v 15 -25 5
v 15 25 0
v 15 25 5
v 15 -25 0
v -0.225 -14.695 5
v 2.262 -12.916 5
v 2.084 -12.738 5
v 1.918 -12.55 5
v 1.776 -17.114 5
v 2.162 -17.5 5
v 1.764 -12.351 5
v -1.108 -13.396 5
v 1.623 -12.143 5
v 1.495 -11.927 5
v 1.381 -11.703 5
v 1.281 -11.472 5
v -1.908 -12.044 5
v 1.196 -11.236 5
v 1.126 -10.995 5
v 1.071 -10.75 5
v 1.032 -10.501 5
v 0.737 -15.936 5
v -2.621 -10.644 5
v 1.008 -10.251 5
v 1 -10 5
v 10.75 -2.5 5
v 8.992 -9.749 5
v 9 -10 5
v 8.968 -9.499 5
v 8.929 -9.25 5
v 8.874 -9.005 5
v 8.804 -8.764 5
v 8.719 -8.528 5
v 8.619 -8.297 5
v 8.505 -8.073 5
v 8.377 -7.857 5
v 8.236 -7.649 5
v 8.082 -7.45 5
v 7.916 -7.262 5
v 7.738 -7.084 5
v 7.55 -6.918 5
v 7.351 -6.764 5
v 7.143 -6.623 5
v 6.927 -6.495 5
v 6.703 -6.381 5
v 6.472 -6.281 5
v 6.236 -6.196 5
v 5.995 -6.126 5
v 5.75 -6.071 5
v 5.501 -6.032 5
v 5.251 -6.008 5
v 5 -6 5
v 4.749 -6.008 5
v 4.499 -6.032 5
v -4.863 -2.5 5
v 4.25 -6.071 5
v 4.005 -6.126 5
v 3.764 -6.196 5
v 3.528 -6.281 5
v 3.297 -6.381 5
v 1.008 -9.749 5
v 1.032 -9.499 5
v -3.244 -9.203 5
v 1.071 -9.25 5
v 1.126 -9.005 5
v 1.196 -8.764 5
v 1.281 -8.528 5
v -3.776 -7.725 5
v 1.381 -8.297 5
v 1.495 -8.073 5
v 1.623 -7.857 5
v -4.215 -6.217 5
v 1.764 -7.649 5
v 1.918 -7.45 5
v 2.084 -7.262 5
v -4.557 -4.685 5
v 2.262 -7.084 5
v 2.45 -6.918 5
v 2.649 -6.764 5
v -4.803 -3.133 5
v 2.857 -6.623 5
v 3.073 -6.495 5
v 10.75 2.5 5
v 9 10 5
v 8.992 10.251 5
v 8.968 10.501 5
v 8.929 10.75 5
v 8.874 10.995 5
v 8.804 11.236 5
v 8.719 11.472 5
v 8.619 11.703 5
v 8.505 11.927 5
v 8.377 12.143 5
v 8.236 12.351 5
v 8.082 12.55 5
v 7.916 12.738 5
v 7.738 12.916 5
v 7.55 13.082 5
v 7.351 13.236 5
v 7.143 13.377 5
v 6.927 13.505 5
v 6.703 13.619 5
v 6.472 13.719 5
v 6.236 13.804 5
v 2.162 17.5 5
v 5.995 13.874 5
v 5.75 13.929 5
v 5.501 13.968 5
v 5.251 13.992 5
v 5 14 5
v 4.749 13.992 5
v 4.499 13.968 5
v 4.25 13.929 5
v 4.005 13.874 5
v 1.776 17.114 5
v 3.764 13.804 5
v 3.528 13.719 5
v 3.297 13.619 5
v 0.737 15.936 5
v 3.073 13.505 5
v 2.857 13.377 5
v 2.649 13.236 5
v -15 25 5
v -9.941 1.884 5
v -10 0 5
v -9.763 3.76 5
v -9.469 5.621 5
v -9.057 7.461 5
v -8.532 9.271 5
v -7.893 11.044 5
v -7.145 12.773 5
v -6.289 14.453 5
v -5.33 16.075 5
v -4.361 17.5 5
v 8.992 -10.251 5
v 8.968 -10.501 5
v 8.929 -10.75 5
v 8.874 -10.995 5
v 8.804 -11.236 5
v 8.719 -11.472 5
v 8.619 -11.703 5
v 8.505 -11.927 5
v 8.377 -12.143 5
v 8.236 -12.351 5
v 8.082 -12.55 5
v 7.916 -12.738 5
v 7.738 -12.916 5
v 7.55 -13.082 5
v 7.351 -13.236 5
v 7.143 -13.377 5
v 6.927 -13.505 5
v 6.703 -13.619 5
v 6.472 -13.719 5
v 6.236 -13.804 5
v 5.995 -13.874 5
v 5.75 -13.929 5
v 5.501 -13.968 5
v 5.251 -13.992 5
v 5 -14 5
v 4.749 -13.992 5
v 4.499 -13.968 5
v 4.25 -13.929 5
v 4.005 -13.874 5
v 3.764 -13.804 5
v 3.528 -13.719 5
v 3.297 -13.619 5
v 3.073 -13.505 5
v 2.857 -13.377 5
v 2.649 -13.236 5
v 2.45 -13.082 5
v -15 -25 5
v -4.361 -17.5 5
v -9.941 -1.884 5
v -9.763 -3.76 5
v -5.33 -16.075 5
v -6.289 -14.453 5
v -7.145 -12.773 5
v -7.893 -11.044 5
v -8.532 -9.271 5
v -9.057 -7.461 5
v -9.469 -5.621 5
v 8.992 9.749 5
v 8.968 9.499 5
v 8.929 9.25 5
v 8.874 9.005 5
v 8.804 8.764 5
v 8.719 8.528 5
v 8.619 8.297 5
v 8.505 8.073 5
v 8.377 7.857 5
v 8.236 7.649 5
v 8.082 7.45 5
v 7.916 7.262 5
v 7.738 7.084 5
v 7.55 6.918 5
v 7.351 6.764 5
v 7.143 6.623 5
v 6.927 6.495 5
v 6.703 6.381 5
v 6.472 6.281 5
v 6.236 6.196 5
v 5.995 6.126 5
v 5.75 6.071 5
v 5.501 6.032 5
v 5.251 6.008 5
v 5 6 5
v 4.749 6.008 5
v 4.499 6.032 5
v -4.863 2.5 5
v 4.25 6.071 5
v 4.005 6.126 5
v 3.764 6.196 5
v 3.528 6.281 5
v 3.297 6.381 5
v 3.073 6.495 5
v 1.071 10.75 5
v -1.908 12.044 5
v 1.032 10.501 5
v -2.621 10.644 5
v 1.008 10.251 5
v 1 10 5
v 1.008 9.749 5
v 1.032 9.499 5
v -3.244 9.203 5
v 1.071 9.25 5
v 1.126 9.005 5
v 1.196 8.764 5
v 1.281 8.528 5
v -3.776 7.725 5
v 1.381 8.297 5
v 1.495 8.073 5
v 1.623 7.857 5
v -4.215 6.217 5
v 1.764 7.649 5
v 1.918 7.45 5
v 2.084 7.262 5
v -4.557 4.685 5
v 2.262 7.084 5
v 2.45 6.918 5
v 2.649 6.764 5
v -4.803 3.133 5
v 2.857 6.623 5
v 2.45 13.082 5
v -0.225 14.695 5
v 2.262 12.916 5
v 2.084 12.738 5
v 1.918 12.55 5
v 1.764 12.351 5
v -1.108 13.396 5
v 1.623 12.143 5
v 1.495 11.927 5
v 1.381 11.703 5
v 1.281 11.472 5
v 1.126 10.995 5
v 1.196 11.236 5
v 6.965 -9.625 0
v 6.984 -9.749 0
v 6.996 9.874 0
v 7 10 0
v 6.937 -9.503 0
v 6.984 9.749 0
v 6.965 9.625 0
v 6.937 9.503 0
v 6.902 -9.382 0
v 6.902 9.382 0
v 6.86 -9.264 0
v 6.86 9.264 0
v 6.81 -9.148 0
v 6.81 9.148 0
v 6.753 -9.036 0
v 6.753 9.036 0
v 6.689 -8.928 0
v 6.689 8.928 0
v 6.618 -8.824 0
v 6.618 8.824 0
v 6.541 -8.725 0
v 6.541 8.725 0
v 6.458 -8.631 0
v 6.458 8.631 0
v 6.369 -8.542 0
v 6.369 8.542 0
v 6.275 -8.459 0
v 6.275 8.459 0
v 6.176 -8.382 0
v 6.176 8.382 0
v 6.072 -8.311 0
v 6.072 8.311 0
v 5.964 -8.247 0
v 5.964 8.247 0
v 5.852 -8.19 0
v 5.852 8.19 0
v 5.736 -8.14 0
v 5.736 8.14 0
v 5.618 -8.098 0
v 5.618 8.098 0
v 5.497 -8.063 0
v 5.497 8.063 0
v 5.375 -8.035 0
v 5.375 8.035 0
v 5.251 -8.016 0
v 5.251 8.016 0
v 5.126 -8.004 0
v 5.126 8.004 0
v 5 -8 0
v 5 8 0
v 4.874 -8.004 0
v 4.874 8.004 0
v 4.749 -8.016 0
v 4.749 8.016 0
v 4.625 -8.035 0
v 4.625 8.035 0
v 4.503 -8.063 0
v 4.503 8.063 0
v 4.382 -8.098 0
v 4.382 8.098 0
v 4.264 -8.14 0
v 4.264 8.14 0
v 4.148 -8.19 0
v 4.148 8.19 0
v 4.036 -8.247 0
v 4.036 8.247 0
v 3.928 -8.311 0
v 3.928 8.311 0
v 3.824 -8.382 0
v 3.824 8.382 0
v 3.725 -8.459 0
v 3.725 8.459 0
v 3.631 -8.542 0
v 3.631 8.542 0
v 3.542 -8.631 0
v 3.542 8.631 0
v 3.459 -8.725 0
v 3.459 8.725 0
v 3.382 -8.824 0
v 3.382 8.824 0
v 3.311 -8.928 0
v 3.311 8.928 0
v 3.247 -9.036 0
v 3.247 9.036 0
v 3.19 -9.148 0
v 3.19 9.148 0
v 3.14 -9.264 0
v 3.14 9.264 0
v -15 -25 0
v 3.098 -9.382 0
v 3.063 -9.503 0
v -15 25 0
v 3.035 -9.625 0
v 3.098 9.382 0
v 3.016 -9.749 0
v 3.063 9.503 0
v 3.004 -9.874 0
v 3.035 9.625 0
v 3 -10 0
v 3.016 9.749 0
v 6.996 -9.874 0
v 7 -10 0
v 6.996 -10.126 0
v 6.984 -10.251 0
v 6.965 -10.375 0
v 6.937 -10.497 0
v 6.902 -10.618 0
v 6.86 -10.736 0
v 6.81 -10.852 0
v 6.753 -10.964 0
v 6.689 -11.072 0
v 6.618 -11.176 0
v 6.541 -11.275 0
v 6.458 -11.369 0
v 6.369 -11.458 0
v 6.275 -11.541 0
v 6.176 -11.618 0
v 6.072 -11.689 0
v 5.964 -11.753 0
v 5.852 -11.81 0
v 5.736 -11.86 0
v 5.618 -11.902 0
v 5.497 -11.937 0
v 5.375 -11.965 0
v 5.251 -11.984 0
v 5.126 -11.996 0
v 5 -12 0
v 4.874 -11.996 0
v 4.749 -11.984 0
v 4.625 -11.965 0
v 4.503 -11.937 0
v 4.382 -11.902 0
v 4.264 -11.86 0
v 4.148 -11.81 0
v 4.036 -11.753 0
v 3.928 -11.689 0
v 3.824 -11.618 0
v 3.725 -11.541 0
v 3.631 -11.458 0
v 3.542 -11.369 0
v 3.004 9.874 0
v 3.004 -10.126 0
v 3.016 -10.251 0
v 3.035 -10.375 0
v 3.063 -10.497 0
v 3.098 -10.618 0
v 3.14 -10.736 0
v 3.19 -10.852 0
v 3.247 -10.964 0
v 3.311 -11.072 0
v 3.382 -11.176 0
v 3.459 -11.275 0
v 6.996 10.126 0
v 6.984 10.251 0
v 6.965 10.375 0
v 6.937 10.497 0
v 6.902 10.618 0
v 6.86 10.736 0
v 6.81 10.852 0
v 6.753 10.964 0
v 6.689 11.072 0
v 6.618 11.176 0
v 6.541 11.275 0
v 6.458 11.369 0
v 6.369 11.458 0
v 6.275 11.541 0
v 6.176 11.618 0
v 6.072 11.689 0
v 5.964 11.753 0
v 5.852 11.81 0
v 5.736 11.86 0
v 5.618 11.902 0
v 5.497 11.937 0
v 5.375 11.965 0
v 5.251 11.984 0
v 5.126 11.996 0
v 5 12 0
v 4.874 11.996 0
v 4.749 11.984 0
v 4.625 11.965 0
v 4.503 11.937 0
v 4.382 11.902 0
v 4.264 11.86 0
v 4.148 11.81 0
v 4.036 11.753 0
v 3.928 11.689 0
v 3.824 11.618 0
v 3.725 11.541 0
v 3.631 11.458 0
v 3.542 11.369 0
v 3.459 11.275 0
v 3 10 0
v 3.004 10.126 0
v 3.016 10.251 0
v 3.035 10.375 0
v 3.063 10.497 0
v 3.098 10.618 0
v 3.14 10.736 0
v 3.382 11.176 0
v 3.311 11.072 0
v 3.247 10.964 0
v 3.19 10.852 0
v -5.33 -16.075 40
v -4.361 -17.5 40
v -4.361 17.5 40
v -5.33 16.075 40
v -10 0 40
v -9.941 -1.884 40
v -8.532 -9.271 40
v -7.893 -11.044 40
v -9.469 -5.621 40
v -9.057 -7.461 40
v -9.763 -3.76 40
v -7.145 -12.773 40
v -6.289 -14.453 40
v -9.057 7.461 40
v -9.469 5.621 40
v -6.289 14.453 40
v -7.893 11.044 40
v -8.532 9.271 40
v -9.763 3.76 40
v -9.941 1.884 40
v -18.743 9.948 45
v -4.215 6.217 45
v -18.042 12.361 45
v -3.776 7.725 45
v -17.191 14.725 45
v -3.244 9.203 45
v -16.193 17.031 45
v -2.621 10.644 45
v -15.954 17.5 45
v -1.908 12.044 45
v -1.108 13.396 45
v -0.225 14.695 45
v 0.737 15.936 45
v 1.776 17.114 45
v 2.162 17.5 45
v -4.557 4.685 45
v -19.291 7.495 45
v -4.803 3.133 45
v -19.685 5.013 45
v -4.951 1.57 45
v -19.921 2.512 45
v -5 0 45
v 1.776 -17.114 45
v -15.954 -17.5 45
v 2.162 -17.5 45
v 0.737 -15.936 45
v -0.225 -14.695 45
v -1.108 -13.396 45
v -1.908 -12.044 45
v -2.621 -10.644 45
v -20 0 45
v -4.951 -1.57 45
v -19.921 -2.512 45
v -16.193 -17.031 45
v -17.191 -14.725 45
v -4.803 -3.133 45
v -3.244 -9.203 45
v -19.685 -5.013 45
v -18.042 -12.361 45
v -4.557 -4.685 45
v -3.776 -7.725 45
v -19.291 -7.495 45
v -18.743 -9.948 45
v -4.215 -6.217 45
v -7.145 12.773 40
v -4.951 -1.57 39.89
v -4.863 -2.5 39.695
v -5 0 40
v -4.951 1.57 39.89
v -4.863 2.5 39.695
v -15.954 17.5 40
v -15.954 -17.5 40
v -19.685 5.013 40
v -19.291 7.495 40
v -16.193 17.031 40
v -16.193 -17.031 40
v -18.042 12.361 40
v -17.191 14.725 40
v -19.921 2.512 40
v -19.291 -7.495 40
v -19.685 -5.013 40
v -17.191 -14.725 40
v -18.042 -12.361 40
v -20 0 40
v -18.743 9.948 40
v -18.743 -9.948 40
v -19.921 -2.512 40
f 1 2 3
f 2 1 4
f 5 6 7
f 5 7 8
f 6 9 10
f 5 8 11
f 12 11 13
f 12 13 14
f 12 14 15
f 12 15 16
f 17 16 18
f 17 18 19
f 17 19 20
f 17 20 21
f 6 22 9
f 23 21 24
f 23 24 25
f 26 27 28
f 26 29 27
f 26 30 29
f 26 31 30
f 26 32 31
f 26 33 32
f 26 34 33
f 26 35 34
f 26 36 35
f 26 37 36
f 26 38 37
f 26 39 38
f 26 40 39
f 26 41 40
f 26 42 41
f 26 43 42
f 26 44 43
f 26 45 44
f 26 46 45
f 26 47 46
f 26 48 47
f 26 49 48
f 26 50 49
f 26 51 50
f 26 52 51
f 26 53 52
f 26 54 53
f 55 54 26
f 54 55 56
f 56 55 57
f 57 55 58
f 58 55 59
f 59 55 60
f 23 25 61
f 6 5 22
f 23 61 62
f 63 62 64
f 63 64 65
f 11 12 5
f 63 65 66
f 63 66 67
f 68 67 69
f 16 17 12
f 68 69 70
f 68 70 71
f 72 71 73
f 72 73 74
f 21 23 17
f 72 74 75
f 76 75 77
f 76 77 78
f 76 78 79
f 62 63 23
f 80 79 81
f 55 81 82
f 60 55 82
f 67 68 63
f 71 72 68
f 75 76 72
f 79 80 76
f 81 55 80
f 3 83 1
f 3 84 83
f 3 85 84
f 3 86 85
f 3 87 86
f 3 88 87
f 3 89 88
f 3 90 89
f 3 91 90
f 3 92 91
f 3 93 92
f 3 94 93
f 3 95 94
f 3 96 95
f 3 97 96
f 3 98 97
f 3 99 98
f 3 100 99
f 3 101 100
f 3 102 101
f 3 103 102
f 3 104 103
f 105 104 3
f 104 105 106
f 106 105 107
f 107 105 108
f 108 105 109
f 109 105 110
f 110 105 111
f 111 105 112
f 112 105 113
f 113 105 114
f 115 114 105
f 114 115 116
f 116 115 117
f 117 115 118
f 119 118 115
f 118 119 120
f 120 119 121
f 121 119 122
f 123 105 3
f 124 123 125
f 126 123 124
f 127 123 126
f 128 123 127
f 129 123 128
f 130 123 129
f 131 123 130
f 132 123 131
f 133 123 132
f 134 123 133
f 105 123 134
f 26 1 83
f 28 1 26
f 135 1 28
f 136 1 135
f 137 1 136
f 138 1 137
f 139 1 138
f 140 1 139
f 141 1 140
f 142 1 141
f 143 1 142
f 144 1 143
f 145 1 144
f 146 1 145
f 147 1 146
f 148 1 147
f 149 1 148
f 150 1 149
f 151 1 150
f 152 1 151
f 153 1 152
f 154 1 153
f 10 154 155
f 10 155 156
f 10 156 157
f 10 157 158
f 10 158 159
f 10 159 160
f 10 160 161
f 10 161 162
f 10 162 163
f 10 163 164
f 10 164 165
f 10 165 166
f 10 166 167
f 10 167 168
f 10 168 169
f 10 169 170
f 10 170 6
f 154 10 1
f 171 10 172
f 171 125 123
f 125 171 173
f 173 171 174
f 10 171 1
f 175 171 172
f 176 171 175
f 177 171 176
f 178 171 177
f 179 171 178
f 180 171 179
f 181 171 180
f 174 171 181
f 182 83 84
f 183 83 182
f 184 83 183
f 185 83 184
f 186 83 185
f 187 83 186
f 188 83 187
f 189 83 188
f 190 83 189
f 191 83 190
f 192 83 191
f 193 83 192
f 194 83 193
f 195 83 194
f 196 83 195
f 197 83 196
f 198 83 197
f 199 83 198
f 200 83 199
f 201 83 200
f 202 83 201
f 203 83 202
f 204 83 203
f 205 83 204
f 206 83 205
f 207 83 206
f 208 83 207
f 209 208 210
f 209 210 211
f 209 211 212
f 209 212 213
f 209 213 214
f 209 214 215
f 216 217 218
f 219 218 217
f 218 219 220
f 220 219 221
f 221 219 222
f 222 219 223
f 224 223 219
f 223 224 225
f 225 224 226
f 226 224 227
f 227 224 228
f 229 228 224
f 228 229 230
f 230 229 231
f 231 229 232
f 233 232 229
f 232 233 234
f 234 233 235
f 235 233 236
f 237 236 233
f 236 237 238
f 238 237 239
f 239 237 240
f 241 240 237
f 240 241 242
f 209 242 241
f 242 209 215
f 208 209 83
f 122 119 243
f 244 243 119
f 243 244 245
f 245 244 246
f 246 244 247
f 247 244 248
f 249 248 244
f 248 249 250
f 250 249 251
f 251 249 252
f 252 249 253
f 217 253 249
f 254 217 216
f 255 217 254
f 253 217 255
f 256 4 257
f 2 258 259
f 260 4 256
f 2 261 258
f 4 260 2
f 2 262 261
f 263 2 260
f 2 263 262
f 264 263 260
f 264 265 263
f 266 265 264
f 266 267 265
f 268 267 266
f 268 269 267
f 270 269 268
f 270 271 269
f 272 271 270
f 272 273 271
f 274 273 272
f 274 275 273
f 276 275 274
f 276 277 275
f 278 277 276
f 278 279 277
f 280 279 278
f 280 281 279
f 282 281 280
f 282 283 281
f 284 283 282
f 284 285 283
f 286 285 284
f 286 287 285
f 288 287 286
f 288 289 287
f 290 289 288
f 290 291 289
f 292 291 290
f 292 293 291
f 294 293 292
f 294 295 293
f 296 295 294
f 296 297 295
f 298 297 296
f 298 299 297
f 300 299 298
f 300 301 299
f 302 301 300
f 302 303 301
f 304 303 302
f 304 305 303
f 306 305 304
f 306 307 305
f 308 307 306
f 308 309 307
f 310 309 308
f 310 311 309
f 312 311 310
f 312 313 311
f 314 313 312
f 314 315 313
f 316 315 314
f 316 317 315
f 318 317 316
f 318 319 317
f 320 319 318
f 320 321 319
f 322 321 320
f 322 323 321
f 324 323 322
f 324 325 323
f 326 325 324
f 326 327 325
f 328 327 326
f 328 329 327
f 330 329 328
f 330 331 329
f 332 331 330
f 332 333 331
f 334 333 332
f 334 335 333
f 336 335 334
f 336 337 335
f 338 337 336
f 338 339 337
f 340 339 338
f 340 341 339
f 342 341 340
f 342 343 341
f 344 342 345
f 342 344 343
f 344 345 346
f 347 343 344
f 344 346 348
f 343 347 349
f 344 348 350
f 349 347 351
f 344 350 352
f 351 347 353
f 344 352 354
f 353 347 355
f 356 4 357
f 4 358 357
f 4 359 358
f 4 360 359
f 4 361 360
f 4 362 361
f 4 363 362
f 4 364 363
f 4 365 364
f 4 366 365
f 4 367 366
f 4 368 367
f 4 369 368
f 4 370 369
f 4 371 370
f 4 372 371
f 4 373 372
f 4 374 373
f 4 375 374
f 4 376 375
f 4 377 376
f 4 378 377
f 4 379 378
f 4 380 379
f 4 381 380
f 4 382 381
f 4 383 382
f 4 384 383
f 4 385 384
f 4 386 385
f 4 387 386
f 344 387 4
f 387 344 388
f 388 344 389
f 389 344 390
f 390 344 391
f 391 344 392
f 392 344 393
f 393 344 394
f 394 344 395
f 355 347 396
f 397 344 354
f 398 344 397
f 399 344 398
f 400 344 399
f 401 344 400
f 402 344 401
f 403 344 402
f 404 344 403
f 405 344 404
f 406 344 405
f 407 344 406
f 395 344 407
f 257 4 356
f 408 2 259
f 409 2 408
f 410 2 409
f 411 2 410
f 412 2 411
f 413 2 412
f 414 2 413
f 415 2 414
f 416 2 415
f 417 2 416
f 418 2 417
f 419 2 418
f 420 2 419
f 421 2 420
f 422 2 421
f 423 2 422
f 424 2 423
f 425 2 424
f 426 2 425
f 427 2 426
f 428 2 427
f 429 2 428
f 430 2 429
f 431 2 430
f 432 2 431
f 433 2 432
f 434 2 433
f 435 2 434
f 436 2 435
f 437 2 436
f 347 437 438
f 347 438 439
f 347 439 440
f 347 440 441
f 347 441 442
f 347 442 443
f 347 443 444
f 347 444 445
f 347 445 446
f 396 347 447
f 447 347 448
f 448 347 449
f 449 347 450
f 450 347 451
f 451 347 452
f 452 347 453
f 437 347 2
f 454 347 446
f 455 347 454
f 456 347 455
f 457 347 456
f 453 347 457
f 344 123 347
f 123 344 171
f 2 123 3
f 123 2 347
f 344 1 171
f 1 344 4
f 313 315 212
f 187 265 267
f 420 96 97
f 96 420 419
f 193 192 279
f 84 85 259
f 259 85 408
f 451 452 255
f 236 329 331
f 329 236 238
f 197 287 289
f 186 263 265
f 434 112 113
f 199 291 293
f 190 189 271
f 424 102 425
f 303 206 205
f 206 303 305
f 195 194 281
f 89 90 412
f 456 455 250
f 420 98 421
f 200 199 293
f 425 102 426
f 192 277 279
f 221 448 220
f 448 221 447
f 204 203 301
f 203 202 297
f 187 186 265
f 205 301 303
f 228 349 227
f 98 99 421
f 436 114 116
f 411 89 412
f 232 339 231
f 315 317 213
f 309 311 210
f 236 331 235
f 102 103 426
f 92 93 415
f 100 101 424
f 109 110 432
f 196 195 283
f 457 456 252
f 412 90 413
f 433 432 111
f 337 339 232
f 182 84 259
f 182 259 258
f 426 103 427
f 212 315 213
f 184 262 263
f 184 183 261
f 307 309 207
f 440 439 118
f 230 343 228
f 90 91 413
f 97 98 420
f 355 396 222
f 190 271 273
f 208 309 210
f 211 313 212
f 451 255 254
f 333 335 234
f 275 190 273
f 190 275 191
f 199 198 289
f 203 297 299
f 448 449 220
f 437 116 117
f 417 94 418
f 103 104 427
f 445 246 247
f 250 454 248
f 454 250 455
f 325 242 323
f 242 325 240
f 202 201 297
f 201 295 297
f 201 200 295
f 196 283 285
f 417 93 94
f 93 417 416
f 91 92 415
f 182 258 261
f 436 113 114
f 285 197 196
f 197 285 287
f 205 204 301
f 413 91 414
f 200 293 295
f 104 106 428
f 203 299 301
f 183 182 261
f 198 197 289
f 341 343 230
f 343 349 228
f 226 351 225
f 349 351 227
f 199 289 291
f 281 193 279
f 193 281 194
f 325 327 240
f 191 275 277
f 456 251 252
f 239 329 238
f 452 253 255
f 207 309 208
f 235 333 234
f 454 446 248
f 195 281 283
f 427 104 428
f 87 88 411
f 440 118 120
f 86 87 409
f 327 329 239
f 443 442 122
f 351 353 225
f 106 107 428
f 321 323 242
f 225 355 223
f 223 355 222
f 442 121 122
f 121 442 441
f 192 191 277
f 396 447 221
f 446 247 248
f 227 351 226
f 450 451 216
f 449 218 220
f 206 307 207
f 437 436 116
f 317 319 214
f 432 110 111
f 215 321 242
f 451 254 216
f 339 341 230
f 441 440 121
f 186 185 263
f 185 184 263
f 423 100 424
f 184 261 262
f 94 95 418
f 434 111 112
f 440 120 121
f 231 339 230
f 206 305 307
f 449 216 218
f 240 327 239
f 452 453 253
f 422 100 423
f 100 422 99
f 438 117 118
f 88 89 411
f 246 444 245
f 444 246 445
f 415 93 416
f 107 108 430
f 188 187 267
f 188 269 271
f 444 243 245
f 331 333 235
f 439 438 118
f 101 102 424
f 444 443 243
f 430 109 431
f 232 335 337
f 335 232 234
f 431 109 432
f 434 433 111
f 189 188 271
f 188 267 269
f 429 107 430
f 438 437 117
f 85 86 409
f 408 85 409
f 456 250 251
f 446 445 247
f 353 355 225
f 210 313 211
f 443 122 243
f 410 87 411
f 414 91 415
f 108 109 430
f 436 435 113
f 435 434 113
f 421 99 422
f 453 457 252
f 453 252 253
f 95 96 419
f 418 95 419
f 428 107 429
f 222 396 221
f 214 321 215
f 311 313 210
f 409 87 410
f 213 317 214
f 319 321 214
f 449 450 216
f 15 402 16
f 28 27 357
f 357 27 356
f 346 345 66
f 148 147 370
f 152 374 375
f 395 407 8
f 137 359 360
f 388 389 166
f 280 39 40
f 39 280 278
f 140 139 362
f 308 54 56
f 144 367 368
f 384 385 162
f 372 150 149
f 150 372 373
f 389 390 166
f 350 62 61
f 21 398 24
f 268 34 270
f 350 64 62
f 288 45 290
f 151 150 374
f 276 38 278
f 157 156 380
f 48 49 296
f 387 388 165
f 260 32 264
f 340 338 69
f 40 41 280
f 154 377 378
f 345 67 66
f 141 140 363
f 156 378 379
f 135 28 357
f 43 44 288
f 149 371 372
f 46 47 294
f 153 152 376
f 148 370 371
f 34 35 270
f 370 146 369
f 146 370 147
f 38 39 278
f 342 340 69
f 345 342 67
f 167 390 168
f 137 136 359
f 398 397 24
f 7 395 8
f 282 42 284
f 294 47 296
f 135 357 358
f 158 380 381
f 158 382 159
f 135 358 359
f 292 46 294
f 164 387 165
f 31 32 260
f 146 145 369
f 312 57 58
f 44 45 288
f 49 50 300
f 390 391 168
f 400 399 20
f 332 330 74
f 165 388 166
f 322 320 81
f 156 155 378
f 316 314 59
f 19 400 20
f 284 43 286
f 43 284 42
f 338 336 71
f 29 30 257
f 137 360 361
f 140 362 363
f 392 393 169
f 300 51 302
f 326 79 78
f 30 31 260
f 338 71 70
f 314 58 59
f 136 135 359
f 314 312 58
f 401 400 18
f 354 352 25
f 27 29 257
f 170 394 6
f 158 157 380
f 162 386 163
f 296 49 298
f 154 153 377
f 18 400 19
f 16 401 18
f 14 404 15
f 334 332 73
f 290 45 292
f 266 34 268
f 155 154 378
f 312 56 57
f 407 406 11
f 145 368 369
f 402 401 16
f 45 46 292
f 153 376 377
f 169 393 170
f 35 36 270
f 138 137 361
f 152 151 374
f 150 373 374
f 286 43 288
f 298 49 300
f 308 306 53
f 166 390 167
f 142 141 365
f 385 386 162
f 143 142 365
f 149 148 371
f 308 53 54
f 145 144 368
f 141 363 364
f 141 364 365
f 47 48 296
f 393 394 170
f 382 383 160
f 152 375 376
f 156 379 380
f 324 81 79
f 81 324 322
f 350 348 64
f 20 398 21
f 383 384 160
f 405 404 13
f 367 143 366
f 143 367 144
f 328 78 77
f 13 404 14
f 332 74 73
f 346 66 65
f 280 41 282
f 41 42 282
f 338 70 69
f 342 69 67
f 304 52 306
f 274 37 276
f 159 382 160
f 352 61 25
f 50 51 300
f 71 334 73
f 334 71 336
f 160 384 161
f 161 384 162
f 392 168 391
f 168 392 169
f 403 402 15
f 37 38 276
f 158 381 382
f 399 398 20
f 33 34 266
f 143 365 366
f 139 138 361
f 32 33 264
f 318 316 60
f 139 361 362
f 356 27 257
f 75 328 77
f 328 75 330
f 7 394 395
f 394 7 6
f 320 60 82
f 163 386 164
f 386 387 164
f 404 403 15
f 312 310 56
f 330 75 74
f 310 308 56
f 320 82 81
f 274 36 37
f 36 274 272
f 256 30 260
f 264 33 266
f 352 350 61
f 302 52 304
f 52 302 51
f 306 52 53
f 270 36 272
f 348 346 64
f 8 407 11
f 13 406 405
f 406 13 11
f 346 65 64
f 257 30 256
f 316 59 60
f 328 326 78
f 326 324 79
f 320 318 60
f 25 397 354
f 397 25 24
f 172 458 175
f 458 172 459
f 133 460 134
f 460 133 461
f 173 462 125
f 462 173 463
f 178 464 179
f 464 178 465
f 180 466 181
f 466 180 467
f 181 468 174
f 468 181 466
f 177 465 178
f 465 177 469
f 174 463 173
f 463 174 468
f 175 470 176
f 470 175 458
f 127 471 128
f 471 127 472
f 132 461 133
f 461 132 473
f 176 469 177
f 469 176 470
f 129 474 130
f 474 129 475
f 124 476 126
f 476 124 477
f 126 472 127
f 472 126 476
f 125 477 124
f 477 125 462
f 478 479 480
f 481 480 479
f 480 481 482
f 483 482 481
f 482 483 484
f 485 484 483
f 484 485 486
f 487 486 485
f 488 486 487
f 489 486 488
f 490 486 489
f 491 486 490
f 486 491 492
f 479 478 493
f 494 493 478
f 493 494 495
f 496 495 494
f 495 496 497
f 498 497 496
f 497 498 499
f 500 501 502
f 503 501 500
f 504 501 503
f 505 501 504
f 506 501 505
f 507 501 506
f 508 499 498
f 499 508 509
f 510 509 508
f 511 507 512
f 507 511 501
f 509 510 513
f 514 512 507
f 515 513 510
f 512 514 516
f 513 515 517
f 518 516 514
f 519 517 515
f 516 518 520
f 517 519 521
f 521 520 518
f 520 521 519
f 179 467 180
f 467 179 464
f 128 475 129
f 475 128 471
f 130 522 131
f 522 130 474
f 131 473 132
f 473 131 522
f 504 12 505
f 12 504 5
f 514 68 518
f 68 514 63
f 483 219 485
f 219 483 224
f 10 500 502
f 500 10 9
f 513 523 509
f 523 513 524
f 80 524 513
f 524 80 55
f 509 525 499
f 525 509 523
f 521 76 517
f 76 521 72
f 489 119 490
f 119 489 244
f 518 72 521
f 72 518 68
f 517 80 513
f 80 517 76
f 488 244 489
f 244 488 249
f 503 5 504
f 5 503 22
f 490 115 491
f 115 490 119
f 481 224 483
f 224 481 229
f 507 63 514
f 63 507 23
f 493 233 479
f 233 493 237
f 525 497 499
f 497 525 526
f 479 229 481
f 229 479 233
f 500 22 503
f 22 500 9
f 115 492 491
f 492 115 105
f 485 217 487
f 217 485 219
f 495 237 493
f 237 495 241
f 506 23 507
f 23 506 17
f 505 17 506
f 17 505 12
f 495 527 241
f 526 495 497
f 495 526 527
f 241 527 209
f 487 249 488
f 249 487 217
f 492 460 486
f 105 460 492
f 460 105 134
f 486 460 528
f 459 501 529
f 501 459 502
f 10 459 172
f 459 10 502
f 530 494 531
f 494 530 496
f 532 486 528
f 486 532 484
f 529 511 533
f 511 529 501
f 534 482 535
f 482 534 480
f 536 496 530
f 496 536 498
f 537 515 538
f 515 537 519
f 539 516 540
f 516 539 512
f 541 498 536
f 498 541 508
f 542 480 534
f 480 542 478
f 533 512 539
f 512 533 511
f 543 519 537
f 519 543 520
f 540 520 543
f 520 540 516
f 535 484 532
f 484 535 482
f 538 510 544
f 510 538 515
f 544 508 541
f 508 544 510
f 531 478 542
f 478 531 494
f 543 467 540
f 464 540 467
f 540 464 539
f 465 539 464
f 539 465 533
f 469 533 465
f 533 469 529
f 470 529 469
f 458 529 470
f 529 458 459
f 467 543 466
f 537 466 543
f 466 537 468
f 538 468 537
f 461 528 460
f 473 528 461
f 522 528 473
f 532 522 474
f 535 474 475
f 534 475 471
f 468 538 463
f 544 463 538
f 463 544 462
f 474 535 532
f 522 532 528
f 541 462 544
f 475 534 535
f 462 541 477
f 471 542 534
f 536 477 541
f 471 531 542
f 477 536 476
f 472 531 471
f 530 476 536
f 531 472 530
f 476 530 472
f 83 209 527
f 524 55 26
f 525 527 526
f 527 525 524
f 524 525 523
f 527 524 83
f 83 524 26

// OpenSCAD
$fn = 100;
thickness = 5;
diameter = 60;
length = 40;
width = 50;
height = 30;
holeSeparation=40;

module HeadSet(thickness,diameter,length,width){
    
    
   
   translate([diameter/3,0,0]) difference(){
    difference(){
difference(){    
cylinder(h=length,d=diameter,center=false);
cylinder(h=length,d=diameter-thickness*2,center=false);
}
translate([-diameter/4,-diameter/2 ,0])cube([diameter,diameter,length] );
}
translate([-diameter,0.7*(width/2),0])cube([diameter,diameter,length]);
translate([-diameter,-(diameter+0.7*(width/2)),0])cube([diameter,diameter,length]);
}
    
    
    
    }
    
    module Base(alto,ancho,fondo){
        difference(){
        cube([alto,ancho,fondo],center=true);
       translate([5,holeSeparation/4,-thickness/2]) cylinder(h=fondo,d1=4,d2=8);
       translate([5,-holeSeparation/4,-thickness/2]) cylinder(h=fondo,d1=4,d2=8);
            }
        }
        
module tapaSuperior(thickness,length,diameter,width){
   translate([diameter/3,0,0]) difference(){
    difference(){
difference(){    
cylinder(h=thickness,d=diameter+thickness*4,center=false);
cylinder(h=thickness,d=diameter-thickness,center=false);
}
translate([-diameter/4,-diameter/2 ,0])cube([diameter,diameter,length] );
}
translate([-diameter,0.7*(width/2),0])cube([diameter,diameter,length]);
translate([-diameter,-(diameter+0.7*(width/2)),0])cube([diameter,diameter,length]);
translate([0,-100,0])cube([diameter*5,diameter*5,10]);
}    


}   
module soporte(altura,thickness,height){
   translate([0,thickness/2,0])rotate([90,90,0]) {linear_extrude(thickness)polygon(points=[[0,0],[altura,height*0.6],[altura,0]]);}
    
    }
    
    union(){
    translate([-thickness,0,length]){soporte(length,thickness,height);}
    
    translate([0,0,thickness/2])    Base(height,width,thickness);
   translate([0,0,thickness])HeadSet(thickness,diameter,length,width);
   translate([0,0,length]) tapaSuperior(thickness,length,diameter,width);
    }
